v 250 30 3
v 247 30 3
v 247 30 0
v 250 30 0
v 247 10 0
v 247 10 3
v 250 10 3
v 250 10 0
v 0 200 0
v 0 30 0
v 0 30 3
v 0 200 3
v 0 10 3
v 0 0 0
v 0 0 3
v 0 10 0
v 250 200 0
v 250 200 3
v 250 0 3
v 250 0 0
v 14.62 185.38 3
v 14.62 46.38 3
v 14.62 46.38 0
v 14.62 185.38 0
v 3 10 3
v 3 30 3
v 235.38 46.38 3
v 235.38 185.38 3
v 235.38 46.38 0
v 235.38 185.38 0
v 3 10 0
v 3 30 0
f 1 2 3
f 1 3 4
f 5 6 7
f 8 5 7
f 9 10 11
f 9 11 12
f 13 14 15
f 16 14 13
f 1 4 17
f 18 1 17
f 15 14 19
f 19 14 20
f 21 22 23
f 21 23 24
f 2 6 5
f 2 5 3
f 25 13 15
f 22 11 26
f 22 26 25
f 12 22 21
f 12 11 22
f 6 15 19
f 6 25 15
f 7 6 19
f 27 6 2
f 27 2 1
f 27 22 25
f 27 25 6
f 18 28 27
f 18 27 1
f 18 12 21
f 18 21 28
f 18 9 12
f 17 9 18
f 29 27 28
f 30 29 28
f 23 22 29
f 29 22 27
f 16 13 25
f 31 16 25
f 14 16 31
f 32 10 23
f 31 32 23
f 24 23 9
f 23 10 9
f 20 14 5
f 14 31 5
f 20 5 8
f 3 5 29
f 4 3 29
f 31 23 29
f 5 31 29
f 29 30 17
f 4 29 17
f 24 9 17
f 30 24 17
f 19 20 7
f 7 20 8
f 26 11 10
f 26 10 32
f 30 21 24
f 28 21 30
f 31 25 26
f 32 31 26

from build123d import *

# Parameters (mm, degrees)
SKETCH1_W           = 250
SKETCH1_H           = 200
BOSS_EXTRUDE1_DEPTH = 3
SKETCH2_W           = 220.76
SKETCH2_H           = 139
CUT_EXTRUDE1_DEPTH  = 321.170267202
SKETCH5_W           = 3
SKETCH5_H           = 20
CUT_EXTRUDE3_DEPTH  = 10


with BuildPart() as part:
    # Sketch1 → Boss-Extrude1 (new body)
    with BuildSketch(Plane.XY):
        with Locations((125, 100)):
            Rectangle(SKETCH1_W, SKETCH1_H)
    extrude(amount=BOSS_EXTRUDE1_DEPTH)

    # Sketch2 → Cut-Extrude1 (cut, through all)
    with BuildSketch(Plane.XY.offset(3)):
        with Locations((125, 115.88)):
            Rectangle(SKETCH2_W, SKETCH2_H)
    extrude(amount=-CUT_EXTRUDE1_DEPTH, mode=Mode.SUBTRACT)

    # Sketch5 → Cut-Extrude3 (cut)
    with BuildSketch(Plane.XY.offset(3)):
        with Locations((1.5, 20)):
            Rectangle(SKETCH5_W, SKETCH5_H)
        with Locations((248.5, 20)):
            Rectangle(SKETCH5_W, SKETCH5_H)
    extrude(amount=-CUT_EXTRUDE3_DEPTH, mode=Mode.SUBTRACT)


solid = part.part
